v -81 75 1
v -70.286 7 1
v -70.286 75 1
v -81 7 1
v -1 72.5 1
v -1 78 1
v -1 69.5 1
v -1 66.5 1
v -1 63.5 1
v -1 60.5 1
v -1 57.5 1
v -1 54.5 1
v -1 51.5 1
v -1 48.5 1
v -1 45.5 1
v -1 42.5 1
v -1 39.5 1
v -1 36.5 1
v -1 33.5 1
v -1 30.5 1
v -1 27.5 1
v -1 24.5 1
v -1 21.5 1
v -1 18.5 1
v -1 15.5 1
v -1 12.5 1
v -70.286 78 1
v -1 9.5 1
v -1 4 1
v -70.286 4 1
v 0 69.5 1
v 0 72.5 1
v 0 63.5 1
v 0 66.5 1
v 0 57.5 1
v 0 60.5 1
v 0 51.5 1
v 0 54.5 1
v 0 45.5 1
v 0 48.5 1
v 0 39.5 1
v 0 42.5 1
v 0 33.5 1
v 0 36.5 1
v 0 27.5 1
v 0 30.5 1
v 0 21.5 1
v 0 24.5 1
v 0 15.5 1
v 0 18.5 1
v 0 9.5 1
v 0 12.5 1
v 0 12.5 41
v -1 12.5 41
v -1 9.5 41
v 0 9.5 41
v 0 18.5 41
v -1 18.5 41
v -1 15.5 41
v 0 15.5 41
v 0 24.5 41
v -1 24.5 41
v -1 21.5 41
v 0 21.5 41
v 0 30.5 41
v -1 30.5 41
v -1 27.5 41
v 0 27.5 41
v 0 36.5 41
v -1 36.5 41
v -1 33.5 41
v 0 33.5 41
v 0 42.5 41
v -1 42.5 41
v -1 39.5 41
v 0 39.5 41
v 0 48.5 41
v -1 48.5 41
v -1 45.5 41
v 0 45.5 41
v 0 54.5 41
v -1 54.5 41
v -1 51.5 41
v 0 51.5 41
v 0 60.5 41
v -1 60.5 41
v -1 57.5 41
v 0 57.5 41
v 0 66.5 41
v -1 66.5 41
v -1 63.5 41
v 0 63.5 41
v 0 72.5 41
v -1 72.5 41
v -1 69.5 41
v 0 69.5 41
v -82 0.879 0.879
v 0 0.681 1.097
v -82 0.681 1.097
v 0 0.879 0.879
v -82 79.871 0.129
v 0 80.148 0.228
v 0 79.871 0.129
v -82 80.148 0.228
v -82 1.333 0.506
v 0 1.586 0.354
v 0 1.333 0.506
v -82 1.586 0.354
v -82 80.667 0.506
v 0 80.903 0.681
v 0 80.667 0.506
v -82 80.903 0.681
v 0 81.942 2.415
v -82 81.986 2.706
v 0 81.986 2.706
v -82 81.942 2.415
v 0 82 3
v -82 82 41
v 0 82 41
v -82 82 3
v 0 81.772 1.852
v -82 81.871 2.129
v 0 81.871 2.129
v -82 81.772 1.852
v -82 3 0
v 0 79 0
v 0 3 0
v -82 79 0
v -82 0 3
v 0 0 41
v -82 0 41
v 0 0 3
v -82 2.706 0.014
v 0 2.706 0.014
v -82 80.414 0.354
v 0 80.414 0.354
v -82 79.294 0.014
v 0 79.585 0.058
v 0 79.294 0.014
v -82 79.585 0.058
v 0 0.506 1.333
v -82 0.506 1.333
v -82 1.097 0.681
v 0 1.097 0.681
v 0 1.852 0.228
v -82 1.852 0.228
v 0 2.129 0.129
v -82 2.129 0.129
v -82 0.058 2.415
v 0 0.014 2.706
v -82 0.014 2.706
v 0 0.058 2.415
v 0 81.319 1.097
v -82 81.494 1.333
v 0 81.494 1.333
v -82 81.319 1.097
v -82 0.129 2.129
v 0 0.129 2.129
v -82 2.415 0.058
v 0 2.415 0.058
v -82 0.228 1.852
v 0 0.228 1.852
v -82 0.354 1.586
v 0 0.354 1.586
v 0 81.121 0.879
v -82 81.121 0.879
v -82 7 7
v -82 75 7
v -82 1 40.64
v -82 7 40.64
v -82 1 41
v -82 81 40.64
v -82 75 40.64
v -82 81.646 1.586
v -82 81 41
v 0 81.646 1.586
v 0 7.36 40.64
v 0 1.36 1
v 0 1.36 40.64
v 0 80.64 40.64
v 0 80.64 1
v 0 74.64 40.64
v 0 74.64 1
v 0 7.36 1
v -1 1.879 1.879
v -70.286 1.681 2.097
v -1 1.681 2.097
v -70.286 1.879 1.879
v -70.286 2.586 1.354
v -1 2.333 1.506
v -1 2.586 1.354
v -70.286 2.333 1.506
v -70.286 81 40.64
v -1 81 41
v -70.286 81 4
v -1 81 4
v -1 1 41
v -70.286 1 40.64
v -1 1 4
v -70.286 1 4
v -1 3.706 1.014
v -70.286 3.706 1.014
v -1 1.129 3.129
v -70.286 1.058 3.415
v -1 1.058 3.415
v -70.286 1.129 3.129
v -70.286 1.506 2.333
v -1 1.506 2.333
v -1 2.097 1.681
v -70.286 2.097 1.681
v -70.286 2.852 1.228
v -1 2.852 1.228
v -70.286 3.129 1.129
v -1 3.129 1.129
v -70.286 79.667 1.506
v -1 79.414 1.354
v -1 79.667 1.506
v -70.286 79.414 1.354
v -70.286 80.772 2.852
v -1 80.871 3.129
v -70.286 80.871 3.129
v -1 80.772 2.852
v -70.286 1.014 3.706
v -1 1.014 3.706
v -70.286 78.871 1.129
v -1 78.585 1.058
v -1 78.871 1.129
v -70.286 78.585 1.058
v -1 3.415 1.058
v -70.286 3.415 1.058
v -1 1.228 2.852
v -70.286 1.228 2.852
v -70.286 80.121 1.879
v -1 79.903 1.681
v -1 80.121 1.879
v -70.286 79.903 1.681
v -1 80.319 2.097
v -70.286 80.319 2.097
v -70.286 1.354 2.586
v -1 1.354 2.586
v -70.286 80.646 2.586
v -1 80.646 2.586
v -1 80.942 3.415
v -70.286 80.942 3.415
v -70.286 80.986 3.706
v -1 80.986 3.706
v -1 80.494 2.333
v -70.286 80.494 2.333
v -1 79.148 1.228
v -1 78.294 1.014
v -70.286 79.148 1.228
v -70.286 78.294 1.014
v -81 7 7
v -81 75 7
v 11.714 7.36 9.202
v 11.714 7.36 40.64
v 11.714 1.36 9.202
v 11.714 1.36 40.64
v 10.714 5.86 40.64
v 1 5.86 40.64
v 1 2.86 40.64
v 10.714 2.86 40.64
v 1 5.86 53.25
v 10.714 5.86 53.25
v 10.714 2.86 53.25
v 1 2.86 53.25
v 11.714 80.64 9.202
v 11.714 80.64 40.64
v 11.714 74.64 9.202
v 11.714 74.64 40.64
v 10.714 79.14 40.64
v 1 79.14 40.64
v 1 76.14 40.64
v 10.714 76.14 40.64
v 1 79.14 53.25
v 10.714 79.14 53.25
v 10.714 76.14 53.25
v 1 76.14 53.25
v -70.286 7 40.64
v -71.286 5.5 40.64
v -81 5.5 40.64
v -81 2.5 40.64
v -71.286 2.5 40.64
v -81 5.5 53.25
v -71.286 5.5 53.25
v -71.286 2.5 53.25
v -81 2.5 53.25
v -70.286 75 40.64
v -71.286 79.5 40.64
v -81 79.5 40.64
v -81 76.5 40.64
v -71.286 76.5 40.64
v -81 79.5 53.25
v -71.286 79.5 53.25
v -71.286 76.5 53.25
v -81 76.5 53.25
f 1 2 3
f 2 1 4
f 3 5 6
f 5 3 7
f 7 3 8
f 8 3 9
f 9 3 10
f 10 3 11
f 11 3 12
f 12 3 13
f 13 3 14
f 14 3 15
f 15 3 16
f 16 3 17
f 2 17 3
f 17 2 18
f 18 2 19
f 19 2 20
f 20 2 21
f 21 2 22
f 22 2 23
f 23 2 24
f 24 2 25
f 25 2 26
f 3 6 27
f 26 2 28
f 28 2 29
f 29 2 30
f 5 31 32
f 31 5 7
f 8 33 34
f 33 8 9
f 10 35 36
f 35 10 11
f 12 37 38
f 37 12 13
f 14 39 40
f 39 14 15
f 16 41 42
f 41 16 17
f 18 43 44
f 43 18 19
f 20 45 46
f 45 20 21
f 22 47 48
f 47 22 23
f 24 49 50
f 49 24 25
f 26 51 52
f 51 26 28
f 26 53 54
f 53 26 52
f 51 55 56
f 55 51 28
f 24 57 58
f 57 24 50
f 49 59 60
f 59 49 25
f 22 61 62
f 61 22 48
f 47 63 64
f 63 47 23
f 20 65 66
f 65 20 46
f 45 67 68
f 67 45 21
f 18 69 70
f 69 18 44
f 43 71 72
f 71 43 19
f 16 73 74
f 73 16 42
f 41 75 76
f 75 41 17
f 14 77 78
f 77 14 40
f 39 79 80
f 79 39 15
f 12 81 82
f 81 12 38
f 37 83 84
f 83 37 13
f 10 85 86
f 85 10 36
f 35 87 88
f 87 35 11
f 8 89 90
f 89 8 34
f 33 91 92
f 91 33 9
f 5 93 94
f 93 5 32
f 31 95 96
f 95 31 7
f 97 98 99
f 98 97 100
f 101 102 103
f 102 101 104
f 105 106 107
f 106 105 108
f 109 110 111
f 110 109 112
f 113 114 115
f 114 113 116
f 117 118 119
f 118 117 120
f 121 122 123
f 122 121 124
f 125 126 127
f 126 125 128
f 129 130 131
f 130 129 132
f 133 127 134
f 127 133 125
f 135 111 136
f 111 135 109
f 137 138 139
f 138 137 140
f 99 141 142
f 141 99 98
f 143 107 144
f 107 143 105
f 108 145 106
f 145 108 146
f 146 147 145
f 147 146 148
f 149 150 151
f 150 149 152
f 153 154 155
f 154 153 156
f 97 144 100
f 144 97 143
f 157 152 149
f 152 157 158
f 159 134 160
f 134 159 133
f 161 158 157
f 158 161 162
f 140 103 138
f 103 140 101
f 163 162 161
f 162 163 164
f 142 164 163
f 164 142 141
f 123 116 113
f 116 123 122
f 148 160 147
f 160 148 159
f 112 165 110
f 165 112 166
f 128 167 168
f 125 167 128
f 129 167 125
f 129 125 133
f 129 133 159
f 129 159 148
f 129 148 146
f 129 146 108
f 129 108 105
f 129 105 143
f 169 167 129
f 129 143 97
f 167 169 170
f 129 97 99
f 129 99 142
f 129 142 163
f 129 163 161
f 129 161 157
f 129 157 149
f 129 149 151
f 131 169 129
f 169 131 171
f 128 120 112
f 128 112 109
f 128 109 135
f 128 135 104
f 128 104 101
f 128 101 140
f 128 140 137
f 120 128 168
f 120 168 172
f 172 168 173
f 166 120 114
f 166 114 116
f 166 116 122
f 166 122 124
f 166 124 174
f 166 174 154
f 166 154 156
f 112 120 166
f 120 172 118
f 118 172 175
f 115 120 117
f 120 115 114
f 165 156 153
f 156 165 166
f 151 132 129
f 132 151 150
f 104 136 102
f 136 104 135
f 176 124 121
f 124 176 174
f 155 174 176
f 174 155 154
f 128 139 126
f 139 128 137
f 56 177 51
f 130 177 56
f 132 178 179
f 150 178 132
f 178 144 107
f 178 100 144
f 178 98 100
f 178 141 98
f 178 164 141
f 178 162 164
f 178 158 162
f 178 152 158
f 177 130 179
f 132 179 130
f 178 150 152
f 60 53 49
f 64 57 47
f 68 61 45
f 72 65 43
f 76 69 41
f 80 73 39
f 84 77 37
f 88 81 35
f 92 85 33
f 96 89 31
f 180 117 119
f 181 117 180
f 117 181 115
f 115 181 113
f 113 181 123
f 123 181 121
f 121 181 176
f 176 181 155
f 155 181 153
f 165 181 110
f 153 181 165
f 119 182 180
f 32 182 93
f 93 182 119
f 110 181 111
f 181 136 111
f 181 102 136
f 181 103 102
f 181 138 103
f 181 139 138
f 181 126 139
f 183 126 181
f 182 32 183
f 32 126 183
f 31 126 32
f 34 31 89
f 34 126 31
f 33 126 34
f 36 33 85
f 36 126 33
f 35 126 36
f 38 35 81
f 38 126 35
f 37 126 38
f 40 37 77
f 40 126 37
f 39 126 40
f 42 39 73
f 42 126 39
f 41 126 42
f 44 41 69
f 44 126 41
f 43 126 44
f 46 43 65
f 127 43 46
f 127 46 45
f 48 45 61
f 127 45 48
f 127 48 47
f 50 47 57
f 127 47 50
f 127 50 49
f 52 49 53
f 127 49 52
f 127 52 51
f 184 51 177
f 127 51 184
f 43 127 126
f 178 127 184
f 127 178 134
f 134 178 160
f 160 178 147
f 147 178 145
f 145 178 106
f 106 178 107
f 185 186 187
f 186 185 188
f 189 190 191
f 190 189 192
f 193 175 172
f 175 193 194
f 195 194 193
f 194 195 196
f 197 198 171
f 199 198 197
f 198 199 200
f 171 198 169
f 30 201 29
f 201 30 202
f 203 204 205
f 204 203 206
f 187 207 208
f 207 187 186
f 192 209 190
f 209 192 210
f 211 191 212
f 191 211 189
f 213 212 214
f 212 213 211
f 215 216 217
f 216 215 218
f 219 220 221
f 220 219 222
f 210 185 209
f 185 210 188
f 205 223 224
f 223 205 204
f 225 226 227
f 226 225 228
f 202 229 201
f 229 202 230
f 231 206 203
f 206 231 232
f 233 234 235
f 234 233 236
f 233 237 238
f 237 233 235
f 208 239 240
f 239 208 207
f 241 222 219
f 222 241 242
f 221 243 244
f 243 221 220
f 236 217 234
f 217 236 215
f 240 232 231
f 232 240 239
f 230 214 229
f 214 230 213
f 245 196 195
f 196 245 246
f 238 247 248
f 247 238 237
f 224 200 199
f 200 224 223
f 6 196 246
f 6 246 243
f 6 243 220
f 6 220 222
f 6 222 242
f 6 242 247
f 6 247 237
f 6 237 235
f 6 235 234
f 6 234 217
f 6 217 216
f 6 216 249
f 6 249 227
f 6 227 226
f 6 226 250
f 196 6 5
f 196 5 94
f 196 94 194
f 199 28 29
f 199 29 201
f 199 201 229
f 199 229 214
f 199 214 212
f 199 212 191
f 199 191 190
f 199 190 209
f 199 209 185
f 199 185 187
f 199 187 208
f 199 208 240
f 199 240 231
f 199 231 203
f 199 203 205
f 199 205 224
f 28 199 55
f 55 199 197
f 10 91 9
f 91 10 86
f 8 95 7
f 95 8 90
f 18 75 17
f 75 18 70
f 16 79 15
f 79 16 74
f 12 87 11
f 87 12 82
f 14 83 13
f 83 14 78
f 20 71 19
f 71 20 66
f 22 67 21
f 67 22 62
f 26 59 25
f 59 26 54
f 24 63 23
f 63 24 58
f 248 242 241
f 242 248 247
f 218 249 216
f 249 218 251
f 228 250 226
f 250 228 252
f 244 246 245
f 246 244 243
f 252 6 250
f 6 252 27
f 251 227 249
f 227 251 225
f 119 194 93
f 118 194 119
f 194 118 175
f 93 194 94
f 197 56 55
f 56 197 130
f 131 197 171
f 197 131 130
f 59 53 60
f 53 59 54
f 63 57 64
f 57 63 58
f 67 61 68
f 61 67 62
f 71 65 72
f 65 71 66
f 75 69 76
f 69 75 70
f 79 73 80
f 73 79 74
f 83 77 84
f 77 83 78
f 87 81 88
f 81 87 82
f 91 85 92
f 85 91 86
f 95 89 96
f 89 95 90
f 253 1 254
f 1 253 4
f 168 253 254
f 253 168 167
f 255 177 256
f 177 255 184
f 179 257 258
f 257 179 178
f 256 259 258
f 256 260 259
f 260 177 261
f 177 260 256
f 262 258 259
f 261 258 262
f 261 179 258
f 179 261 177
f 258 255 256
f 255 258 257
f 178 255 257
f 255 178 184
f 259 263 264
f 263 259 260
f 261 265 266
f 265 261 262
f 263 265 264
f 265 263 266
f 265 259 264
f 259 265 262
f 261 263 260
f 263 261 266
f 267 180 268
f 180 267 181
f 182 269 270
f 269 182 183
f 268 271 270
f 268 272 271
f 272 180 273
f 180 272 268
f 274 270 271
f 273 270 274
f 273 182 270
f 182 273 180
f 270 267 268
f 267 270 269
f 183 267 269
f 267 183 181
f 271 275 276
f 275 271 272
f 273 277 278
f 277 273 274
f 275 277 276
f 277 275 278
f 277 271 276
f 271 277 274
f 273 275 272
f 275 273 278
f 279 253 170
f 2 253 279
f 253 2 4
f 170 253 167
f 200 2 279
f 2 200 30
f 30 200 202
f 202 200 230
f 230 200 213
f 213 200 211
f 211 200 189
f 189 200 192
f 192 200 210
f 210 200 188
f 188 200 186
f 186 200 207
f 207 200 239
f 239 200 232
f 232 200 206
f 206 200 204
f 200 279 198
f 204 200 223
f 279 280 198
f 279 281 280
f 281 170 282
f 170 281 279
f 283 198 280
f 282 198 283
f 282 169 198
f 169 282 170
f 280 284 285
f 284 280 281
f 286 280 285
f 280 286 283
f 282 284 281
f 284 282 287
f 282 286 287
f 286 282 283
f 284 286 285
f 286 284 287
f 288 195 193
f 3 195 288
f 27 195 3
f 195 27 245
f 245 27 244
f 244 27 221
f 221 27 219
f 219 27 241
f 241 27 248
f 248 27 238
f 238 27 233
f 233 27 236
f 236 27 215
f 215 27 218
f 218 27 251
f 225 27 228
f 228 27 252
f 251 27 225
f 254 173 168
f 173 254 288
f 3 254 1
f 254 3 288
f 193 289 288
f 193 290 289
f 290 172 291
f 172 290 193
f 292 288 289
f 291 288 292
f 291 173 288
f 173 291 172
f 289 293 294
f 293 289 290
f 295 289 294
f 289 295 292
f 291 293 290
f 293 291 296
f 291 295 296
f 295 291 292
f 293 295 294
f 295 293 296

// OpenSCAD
// file: mixin.scad
$fn = 64;

POT_EDGE = 82;
POT_HEIGHT = 82;
WALL_WIDTH = 1;
CORNER_RADIUS = 3;

LEG_ANGLE = 55;
LEG_SLOPE = 1 / tan(LEG_ANGLE);
LEG_WIDTH = 6;
LEG_LENGTH = POT_HEIGHT / 7;

PIN_LENGTH = LEG_LENGTH - WALL_WIDTH * 2;
PIN_WIDTH = 3;
PIN_HEIGHT = POT_EDGE / 2 + POT_EDGE / 8;
FIT_GAP = 0.36;
OVERCUT = 0.1;

FIRST_LEG_Y = WALL_WIDTH + FIT_GAP;
SECOND_LEG_Y = POT_EDGE - LEG_WIDTH - WALL_WIDTH - FIT_GAP;

SLOT_WIDTH = 3;
SLOT_STEP = 6;

module rounded_box(size = [10, 10, 5], corner_radius = CORNER_RADIUS) {
  translate([size[0] / 2, size[1] / 2, 0]) {
    linear_extrude(height=size[2]) {
      minkowski() {
        square([size[0] - 2 * corner_radius, size[1] - 2 * corner_radius], center=true);
        circle(r=corner_radius);
      }
    }
  }
}

function leg_profile(slope) = let(
  underside_z0 = WALL_WIDTH,
  underside_z1 = WALL_WIDTH + slope * LEG_LENGTH,
  top_z = POT_EDGE / 2 - FIT_GAP
) [
  [0, underside_z0],
  [LEG_LENGTH, underside_z1],
  [LEG_LENGTH, top_z],
  [0, top_z],
];

function pin_profile(slope, pin_length) = let(
  x0 = (LEG_LENGTH - pin_length) / 2,
  x1 = (LEG_LENGTH + pin_length) / 2,
  floor_z0 = WALL_WIDTH * 2 + slope * x0,
  floor_z1 = WALL_WIDTH * 2 + slope * x1,
  top_z = WALL_WIDTH * 2 + PIN_HEIGHT
) [
  [x0, floor_z0],
  [x1, floor_z1],
  [x1, top_z],
  [x0, top_z],
];

module extruded_profile(profile, width) {
  translate([0, width, 0]) rotate([90, 0, 0])
    linear_extrude(height=width) polygon(points=profile);
}

module leg_with_pin(slope) {
  extruded_profile(leg_profile(slope), LEG_WIDTH);
  translate([0, (LEG_WIDTH - PIN_WIDTH) / 2, 0])
    extruded_profile(pin_profile(slope, PIN_LENGTH), PIN_WIDTH);
}

module leg_with_socket(slope) {
  difference() {
    extruded_profile(leg_profile(slope), LEG_WIDTH);
    translate([0, (LEG_WIDTH - PIN_WIDTH - FIT_GAP) / 2, 0])
      extruded_profile(pin_profile(slope, PIN_LENGTH + FIT_GAP), PIN_WIDTH + FIT_GAP);
  }
}

module bottom_slots() {
  between_legs_span = POT_EDGE - 2 * (CORNER_RADIUS + LEG_WIDTH);
  slot_count_half = floor((between_legs_span / 2 - SLOT_WIDTH / 2) / SLOT_STEP);
  for (slot_index = [-slot_count_half:slot_count_half])
    translate([WALL_WIDTH, POT_EDGE / 2 + slot_index * SLOT_STEP - SLOT_WIDTH / 2, -OVERCUT])
      cube([POT_EDGE, SLOT_WIDTH, WALL_WIDTH + OVERCUT * 2]);
}

module pot_shell() {
  rotate([0, -90, 0]) difference() {
    rounded_box([POT_EDGE, POT_EDGE, POT_HEIGHT]);
    translate([WALL_WIDTH, WALL_WIDTH, WALL_WIDTH])
      rounded_box([
        POT_EDGE - WALL_WIDTH * 2,
        POT_EDGE - WALL_WIDTH * 2,
        POT_HEIGHT + WALL_WIDTH * 2,
      ]);
    translate([POT_EDGE / 2, -WALL_WIDTH, -WALL_WIDTH])
      cube([POT_EDGE, POT_EDGE + WALL_WIDTH * 2, POT_HEIGHT * 2]);

    bottom_slots();
  }

  translate([-POT_HEIGHT, WALL_WIDTH, WALL_WIDTH]) cube([WALL_WIDTH, POT_EDGE - WALL_WIDTH * 2, LEG_WIDTH]);
}
// main file
include <mixin.scad>;

module inner_shell_pins() {
  pot_shell();
  translate([0, FIRST_LEG_Y, 0]) leg_with_pin(LEG_SLOPE);
  translate([0, SECOND_LEG_Y, 0]) leg_with_pin(LEG_SLOPE);
  translate([-POT_HEIGHT, WALL_WIDTH, 0]) leg_with_pin(0);
  translate([-POT_HEIGHT, POT_EDGE - WALL_WIDTH - LEG_WIDTH, 0]) leg_with_pin(0);
}

inner_shell_pins();
